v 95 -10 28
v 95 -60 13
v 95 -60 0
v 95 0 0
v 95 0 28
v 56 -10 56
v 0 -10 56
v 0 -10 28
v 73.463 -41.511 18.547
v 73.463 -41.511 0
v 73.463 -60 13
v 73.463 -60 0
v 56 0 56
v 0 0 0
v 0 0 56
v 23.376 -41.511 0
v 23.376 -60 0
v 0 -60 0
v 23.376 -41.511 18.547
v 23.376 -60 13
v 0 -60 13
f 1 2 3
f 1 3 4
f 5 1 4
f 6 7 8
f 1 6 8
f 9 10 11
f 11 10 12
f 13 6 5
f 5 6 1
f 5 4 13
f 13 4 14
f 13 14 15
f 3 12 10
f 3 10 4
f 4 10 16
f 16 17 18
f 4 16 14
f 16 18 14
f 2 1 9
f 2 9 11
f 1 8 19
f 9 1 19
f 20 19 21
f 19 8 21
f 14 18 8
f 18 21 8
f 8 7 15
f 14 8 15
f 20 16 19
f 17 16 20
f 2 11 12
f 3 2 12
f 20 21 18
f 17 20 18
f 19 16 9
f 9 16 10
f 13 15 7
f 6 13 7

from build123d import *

# Parameters (mm, degrees)
F1_DEPTH = 95
F3_DEPTH = 25
F4_W     = 50.086444
F4_H     = 18.488904
F5_DEPTH = 56.001


with BuildPart() as f1:
    # F0 (on Right) → F1 (new body)
    with BuildSketch(Plane.YZ):
        Polygon((-60, 0), (0, 0), (0, 56), (-10, 56), (-10, 28), (-60, 13), align=None)
    extrude(amount=F1_DEPTH)

    # F2 (on face) → F3 (cut)
    with BuildSketch(Plane.XZ.offset(10)):
        Polygon((56, 56), (95, 28), (95, 56), align=None)
    extrude(amount=-F3_DEPTH, mode=Mode.SUBTRACT)

    # F4 (on face) → F5 (cut, through all)
    with BuildSketch(Plane(origin=(0, 0, 0), x_dir=(1, 0, 0), z_dir=(0, 0, -1))):
        with Locations((48.419592, 50.755548)):
            Rectangle(F4_W, F4_H)
    extrude(amount=-F5_DEPTH, mode=Mode.SUBTRACT)


solid = f1.part
